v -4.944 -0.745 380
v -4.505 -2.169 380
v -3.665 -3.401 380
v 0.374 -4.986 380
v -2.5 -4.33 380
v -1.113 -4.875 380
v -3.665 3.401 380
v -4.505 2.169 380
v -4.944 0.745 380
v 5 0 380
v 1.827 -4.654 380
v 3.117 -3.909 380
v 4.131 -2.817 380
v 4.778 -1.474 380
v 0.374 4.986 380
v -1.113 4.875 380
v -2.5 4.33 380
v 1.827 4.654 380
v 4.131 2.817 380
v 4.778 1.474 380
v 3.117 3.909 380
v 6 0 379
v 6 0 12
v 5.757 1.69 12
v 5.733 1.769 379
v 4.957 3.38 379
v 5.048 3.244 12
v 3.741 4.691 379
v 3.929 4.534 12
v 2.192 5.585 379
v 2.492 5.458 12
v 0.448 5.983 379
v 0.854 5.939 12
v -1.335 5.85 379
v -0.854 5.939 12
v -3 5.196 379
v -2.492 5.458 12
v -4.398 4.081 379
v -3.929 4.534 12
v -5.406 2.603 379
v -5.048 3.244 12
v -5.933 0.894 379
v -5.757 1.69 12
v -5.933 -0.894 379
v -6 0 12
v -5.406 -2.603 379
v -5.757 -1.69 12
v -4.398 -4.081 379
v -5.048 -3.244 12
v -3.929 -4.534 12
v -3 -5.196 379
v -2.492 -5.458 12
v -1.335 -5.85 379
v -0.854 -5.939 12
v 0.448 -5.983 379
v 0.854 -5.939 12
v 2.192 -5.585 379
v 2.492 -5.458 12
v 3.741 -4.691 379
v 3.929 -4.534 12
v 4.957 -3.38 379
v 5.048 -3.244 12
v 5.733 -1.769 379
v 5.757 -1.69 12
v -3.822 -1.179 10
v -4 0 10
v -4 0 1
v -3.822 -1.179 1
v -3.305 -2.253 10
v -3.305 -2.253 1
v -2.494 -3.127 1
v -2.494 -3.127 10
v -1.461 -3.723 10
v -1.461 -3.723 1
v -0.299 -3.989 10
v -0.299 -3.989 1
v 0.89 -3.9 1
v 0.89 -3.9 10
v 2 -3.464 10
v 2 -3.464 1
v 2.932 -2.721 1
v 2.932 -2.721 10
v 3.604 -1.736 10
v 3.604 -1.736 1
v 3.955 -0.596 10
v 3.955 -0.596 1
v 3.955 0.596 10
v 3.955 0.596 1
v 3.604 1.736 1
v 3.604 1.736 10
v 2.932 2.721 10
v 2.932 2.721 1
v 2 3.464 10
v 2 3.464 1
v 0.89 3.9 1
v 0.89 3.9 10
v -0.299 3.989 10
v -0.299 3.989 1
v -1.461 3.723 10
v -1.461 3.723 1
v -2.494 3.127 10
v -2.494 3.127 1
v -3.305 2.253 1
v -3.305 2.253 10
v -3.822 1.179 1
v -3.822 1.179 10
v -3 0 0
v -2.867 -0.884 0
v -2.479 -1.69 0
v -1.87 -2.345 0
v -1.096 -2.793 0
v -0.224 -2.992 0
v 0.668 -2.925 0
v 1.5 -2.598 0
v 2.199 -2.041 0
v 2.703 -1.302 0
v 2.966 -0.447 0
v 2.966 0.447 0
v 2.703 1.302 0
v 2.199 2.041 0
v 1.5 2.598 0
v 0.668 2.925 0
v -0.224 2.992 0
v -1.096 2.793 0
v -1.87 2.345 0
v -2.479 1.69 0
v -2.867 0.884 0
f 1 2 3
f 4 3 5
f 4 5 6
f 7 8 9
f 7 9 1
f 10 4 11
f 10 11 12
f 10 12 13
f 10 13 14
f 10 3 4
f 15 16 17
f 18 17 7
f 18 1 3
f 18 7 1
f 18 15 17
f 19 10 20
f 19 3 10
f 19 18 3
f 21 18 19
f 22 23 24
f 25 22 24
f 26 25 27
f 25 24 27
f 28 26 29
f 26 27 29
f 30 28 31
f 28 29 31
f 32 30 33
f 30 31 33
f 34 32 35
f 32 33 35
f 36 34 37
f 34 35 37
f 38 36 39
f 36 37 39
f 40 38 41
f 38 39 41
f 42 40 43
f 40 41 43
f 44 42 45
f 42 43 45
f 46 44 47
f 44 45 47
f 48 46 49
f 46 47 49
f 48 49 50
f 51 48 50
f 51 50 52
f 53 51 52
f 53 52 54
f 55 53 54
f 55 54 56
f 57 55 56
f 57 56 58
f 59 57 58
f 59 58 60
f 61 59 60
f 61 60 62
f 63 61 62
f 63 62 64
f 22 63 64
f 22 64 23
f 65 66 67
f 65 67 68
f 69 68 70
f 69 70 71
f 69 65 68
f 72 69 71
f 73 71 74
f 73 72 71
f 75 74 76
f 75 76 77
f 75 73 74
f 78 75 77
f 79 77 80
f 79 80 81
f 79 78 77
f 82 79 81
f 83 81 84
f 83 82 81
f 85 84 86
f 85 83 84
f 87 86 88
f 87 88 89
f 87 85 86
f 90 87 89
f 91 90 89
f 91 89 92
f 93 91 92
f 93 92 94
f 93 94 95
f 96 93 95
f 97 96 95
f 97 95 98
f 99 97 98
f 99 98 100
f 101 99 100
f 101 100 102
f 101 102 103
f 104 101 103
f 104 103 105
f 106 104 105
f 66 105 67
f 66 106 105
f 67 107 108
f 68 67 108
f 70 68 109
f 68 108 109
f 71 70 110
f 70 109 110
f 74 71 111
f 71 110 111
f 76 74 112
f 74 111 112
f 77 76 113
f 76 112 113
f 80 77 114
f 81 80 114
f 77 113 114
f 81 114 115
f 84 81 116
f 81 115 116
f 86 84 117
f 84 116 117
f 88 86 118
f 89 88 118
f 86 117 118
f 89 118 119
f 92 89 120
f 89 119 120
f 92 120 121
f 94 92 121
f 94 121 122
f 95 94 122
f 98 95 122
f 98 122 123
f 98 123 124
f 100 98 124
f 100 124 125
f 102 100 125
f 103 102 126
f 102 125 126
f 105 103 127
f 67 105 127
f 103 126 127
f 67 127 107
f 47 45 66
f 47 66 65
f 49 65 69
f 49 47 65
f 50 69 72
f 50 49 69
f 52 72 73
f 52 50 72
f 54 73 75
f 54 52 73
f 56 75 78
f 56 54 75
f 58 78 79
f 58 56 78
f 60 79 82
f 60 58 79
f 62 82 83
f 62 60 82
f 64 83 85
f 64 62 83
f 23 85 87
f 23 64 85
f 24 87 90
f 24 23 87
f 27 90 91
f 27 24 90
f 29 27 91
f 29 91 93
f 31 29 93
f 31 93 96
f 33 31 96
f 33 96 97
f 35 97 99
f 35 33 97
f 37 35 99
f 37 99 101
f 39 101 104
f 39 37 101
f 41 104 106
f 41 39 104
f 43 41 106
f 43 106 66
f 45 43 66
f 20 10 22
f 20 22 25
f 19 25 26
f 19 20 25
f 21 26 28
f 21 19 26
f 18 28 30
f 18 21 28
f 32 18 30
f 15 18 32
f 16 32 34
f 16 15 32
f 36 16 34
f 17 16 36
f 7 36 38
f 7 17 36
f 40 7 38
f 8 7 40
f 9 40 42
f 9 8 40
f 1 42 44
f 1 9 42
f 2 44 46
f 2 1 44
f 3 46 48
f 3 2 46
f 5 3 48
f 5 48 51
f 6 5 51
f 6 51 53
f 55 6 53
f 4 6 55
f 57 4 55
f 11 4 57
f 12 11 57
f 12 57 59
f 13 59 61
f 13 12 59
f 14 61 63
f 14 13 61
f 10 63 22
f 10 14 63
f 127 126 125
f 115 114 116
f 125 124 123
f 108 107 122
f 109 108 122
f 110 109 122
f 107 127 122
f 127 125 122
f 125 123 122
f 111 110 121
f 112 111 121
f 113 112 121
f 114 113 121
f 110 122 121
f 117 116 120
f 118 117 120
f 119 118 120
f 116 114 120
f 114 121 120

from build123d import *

# Parameters (mm, degrees)
SCHIZZO1_R                   = 6
ESTRUSIONE_ESTRUSIONE1_DEPTH = 380
SMUSSO1_SIZE                 = 1


with BuildPart() as part:
    # Schizzo1 → Estrusione-Estrusione1 (new body)
    with BuildSketch(Plane.XY):
        Circle(SCHIZZO1_R)
    extrude(amount=ESTRUSIONE_ESTRUSIONE1_DEPTH)

    # Schizzo2 → Taglia-Rivoluzione1 (revolve, cut)
    with BuildSketch(Plane(origin=(0, 0, 0), x_dir=(1, 0, 0), z_dir=(0, 1, 0))):
        Polygon((-4, -10), (-6, -12), (-6, 0), (-4, 0), align=None)
    revolve(axis=Axis((0, 0, -1.898721367), (0, 0, 1)), mode=Mode.SUBTRACT)

    # Smusso1
    smusso1_edges = [part.edges().sort_by_distance(p)[0] for p in [
        (-6, 0, 380),
        (4, 0, 0),
    ]]
    chamfer(smusso1_edges, length=SMUSSO1_SIZE)


solid = part.part
